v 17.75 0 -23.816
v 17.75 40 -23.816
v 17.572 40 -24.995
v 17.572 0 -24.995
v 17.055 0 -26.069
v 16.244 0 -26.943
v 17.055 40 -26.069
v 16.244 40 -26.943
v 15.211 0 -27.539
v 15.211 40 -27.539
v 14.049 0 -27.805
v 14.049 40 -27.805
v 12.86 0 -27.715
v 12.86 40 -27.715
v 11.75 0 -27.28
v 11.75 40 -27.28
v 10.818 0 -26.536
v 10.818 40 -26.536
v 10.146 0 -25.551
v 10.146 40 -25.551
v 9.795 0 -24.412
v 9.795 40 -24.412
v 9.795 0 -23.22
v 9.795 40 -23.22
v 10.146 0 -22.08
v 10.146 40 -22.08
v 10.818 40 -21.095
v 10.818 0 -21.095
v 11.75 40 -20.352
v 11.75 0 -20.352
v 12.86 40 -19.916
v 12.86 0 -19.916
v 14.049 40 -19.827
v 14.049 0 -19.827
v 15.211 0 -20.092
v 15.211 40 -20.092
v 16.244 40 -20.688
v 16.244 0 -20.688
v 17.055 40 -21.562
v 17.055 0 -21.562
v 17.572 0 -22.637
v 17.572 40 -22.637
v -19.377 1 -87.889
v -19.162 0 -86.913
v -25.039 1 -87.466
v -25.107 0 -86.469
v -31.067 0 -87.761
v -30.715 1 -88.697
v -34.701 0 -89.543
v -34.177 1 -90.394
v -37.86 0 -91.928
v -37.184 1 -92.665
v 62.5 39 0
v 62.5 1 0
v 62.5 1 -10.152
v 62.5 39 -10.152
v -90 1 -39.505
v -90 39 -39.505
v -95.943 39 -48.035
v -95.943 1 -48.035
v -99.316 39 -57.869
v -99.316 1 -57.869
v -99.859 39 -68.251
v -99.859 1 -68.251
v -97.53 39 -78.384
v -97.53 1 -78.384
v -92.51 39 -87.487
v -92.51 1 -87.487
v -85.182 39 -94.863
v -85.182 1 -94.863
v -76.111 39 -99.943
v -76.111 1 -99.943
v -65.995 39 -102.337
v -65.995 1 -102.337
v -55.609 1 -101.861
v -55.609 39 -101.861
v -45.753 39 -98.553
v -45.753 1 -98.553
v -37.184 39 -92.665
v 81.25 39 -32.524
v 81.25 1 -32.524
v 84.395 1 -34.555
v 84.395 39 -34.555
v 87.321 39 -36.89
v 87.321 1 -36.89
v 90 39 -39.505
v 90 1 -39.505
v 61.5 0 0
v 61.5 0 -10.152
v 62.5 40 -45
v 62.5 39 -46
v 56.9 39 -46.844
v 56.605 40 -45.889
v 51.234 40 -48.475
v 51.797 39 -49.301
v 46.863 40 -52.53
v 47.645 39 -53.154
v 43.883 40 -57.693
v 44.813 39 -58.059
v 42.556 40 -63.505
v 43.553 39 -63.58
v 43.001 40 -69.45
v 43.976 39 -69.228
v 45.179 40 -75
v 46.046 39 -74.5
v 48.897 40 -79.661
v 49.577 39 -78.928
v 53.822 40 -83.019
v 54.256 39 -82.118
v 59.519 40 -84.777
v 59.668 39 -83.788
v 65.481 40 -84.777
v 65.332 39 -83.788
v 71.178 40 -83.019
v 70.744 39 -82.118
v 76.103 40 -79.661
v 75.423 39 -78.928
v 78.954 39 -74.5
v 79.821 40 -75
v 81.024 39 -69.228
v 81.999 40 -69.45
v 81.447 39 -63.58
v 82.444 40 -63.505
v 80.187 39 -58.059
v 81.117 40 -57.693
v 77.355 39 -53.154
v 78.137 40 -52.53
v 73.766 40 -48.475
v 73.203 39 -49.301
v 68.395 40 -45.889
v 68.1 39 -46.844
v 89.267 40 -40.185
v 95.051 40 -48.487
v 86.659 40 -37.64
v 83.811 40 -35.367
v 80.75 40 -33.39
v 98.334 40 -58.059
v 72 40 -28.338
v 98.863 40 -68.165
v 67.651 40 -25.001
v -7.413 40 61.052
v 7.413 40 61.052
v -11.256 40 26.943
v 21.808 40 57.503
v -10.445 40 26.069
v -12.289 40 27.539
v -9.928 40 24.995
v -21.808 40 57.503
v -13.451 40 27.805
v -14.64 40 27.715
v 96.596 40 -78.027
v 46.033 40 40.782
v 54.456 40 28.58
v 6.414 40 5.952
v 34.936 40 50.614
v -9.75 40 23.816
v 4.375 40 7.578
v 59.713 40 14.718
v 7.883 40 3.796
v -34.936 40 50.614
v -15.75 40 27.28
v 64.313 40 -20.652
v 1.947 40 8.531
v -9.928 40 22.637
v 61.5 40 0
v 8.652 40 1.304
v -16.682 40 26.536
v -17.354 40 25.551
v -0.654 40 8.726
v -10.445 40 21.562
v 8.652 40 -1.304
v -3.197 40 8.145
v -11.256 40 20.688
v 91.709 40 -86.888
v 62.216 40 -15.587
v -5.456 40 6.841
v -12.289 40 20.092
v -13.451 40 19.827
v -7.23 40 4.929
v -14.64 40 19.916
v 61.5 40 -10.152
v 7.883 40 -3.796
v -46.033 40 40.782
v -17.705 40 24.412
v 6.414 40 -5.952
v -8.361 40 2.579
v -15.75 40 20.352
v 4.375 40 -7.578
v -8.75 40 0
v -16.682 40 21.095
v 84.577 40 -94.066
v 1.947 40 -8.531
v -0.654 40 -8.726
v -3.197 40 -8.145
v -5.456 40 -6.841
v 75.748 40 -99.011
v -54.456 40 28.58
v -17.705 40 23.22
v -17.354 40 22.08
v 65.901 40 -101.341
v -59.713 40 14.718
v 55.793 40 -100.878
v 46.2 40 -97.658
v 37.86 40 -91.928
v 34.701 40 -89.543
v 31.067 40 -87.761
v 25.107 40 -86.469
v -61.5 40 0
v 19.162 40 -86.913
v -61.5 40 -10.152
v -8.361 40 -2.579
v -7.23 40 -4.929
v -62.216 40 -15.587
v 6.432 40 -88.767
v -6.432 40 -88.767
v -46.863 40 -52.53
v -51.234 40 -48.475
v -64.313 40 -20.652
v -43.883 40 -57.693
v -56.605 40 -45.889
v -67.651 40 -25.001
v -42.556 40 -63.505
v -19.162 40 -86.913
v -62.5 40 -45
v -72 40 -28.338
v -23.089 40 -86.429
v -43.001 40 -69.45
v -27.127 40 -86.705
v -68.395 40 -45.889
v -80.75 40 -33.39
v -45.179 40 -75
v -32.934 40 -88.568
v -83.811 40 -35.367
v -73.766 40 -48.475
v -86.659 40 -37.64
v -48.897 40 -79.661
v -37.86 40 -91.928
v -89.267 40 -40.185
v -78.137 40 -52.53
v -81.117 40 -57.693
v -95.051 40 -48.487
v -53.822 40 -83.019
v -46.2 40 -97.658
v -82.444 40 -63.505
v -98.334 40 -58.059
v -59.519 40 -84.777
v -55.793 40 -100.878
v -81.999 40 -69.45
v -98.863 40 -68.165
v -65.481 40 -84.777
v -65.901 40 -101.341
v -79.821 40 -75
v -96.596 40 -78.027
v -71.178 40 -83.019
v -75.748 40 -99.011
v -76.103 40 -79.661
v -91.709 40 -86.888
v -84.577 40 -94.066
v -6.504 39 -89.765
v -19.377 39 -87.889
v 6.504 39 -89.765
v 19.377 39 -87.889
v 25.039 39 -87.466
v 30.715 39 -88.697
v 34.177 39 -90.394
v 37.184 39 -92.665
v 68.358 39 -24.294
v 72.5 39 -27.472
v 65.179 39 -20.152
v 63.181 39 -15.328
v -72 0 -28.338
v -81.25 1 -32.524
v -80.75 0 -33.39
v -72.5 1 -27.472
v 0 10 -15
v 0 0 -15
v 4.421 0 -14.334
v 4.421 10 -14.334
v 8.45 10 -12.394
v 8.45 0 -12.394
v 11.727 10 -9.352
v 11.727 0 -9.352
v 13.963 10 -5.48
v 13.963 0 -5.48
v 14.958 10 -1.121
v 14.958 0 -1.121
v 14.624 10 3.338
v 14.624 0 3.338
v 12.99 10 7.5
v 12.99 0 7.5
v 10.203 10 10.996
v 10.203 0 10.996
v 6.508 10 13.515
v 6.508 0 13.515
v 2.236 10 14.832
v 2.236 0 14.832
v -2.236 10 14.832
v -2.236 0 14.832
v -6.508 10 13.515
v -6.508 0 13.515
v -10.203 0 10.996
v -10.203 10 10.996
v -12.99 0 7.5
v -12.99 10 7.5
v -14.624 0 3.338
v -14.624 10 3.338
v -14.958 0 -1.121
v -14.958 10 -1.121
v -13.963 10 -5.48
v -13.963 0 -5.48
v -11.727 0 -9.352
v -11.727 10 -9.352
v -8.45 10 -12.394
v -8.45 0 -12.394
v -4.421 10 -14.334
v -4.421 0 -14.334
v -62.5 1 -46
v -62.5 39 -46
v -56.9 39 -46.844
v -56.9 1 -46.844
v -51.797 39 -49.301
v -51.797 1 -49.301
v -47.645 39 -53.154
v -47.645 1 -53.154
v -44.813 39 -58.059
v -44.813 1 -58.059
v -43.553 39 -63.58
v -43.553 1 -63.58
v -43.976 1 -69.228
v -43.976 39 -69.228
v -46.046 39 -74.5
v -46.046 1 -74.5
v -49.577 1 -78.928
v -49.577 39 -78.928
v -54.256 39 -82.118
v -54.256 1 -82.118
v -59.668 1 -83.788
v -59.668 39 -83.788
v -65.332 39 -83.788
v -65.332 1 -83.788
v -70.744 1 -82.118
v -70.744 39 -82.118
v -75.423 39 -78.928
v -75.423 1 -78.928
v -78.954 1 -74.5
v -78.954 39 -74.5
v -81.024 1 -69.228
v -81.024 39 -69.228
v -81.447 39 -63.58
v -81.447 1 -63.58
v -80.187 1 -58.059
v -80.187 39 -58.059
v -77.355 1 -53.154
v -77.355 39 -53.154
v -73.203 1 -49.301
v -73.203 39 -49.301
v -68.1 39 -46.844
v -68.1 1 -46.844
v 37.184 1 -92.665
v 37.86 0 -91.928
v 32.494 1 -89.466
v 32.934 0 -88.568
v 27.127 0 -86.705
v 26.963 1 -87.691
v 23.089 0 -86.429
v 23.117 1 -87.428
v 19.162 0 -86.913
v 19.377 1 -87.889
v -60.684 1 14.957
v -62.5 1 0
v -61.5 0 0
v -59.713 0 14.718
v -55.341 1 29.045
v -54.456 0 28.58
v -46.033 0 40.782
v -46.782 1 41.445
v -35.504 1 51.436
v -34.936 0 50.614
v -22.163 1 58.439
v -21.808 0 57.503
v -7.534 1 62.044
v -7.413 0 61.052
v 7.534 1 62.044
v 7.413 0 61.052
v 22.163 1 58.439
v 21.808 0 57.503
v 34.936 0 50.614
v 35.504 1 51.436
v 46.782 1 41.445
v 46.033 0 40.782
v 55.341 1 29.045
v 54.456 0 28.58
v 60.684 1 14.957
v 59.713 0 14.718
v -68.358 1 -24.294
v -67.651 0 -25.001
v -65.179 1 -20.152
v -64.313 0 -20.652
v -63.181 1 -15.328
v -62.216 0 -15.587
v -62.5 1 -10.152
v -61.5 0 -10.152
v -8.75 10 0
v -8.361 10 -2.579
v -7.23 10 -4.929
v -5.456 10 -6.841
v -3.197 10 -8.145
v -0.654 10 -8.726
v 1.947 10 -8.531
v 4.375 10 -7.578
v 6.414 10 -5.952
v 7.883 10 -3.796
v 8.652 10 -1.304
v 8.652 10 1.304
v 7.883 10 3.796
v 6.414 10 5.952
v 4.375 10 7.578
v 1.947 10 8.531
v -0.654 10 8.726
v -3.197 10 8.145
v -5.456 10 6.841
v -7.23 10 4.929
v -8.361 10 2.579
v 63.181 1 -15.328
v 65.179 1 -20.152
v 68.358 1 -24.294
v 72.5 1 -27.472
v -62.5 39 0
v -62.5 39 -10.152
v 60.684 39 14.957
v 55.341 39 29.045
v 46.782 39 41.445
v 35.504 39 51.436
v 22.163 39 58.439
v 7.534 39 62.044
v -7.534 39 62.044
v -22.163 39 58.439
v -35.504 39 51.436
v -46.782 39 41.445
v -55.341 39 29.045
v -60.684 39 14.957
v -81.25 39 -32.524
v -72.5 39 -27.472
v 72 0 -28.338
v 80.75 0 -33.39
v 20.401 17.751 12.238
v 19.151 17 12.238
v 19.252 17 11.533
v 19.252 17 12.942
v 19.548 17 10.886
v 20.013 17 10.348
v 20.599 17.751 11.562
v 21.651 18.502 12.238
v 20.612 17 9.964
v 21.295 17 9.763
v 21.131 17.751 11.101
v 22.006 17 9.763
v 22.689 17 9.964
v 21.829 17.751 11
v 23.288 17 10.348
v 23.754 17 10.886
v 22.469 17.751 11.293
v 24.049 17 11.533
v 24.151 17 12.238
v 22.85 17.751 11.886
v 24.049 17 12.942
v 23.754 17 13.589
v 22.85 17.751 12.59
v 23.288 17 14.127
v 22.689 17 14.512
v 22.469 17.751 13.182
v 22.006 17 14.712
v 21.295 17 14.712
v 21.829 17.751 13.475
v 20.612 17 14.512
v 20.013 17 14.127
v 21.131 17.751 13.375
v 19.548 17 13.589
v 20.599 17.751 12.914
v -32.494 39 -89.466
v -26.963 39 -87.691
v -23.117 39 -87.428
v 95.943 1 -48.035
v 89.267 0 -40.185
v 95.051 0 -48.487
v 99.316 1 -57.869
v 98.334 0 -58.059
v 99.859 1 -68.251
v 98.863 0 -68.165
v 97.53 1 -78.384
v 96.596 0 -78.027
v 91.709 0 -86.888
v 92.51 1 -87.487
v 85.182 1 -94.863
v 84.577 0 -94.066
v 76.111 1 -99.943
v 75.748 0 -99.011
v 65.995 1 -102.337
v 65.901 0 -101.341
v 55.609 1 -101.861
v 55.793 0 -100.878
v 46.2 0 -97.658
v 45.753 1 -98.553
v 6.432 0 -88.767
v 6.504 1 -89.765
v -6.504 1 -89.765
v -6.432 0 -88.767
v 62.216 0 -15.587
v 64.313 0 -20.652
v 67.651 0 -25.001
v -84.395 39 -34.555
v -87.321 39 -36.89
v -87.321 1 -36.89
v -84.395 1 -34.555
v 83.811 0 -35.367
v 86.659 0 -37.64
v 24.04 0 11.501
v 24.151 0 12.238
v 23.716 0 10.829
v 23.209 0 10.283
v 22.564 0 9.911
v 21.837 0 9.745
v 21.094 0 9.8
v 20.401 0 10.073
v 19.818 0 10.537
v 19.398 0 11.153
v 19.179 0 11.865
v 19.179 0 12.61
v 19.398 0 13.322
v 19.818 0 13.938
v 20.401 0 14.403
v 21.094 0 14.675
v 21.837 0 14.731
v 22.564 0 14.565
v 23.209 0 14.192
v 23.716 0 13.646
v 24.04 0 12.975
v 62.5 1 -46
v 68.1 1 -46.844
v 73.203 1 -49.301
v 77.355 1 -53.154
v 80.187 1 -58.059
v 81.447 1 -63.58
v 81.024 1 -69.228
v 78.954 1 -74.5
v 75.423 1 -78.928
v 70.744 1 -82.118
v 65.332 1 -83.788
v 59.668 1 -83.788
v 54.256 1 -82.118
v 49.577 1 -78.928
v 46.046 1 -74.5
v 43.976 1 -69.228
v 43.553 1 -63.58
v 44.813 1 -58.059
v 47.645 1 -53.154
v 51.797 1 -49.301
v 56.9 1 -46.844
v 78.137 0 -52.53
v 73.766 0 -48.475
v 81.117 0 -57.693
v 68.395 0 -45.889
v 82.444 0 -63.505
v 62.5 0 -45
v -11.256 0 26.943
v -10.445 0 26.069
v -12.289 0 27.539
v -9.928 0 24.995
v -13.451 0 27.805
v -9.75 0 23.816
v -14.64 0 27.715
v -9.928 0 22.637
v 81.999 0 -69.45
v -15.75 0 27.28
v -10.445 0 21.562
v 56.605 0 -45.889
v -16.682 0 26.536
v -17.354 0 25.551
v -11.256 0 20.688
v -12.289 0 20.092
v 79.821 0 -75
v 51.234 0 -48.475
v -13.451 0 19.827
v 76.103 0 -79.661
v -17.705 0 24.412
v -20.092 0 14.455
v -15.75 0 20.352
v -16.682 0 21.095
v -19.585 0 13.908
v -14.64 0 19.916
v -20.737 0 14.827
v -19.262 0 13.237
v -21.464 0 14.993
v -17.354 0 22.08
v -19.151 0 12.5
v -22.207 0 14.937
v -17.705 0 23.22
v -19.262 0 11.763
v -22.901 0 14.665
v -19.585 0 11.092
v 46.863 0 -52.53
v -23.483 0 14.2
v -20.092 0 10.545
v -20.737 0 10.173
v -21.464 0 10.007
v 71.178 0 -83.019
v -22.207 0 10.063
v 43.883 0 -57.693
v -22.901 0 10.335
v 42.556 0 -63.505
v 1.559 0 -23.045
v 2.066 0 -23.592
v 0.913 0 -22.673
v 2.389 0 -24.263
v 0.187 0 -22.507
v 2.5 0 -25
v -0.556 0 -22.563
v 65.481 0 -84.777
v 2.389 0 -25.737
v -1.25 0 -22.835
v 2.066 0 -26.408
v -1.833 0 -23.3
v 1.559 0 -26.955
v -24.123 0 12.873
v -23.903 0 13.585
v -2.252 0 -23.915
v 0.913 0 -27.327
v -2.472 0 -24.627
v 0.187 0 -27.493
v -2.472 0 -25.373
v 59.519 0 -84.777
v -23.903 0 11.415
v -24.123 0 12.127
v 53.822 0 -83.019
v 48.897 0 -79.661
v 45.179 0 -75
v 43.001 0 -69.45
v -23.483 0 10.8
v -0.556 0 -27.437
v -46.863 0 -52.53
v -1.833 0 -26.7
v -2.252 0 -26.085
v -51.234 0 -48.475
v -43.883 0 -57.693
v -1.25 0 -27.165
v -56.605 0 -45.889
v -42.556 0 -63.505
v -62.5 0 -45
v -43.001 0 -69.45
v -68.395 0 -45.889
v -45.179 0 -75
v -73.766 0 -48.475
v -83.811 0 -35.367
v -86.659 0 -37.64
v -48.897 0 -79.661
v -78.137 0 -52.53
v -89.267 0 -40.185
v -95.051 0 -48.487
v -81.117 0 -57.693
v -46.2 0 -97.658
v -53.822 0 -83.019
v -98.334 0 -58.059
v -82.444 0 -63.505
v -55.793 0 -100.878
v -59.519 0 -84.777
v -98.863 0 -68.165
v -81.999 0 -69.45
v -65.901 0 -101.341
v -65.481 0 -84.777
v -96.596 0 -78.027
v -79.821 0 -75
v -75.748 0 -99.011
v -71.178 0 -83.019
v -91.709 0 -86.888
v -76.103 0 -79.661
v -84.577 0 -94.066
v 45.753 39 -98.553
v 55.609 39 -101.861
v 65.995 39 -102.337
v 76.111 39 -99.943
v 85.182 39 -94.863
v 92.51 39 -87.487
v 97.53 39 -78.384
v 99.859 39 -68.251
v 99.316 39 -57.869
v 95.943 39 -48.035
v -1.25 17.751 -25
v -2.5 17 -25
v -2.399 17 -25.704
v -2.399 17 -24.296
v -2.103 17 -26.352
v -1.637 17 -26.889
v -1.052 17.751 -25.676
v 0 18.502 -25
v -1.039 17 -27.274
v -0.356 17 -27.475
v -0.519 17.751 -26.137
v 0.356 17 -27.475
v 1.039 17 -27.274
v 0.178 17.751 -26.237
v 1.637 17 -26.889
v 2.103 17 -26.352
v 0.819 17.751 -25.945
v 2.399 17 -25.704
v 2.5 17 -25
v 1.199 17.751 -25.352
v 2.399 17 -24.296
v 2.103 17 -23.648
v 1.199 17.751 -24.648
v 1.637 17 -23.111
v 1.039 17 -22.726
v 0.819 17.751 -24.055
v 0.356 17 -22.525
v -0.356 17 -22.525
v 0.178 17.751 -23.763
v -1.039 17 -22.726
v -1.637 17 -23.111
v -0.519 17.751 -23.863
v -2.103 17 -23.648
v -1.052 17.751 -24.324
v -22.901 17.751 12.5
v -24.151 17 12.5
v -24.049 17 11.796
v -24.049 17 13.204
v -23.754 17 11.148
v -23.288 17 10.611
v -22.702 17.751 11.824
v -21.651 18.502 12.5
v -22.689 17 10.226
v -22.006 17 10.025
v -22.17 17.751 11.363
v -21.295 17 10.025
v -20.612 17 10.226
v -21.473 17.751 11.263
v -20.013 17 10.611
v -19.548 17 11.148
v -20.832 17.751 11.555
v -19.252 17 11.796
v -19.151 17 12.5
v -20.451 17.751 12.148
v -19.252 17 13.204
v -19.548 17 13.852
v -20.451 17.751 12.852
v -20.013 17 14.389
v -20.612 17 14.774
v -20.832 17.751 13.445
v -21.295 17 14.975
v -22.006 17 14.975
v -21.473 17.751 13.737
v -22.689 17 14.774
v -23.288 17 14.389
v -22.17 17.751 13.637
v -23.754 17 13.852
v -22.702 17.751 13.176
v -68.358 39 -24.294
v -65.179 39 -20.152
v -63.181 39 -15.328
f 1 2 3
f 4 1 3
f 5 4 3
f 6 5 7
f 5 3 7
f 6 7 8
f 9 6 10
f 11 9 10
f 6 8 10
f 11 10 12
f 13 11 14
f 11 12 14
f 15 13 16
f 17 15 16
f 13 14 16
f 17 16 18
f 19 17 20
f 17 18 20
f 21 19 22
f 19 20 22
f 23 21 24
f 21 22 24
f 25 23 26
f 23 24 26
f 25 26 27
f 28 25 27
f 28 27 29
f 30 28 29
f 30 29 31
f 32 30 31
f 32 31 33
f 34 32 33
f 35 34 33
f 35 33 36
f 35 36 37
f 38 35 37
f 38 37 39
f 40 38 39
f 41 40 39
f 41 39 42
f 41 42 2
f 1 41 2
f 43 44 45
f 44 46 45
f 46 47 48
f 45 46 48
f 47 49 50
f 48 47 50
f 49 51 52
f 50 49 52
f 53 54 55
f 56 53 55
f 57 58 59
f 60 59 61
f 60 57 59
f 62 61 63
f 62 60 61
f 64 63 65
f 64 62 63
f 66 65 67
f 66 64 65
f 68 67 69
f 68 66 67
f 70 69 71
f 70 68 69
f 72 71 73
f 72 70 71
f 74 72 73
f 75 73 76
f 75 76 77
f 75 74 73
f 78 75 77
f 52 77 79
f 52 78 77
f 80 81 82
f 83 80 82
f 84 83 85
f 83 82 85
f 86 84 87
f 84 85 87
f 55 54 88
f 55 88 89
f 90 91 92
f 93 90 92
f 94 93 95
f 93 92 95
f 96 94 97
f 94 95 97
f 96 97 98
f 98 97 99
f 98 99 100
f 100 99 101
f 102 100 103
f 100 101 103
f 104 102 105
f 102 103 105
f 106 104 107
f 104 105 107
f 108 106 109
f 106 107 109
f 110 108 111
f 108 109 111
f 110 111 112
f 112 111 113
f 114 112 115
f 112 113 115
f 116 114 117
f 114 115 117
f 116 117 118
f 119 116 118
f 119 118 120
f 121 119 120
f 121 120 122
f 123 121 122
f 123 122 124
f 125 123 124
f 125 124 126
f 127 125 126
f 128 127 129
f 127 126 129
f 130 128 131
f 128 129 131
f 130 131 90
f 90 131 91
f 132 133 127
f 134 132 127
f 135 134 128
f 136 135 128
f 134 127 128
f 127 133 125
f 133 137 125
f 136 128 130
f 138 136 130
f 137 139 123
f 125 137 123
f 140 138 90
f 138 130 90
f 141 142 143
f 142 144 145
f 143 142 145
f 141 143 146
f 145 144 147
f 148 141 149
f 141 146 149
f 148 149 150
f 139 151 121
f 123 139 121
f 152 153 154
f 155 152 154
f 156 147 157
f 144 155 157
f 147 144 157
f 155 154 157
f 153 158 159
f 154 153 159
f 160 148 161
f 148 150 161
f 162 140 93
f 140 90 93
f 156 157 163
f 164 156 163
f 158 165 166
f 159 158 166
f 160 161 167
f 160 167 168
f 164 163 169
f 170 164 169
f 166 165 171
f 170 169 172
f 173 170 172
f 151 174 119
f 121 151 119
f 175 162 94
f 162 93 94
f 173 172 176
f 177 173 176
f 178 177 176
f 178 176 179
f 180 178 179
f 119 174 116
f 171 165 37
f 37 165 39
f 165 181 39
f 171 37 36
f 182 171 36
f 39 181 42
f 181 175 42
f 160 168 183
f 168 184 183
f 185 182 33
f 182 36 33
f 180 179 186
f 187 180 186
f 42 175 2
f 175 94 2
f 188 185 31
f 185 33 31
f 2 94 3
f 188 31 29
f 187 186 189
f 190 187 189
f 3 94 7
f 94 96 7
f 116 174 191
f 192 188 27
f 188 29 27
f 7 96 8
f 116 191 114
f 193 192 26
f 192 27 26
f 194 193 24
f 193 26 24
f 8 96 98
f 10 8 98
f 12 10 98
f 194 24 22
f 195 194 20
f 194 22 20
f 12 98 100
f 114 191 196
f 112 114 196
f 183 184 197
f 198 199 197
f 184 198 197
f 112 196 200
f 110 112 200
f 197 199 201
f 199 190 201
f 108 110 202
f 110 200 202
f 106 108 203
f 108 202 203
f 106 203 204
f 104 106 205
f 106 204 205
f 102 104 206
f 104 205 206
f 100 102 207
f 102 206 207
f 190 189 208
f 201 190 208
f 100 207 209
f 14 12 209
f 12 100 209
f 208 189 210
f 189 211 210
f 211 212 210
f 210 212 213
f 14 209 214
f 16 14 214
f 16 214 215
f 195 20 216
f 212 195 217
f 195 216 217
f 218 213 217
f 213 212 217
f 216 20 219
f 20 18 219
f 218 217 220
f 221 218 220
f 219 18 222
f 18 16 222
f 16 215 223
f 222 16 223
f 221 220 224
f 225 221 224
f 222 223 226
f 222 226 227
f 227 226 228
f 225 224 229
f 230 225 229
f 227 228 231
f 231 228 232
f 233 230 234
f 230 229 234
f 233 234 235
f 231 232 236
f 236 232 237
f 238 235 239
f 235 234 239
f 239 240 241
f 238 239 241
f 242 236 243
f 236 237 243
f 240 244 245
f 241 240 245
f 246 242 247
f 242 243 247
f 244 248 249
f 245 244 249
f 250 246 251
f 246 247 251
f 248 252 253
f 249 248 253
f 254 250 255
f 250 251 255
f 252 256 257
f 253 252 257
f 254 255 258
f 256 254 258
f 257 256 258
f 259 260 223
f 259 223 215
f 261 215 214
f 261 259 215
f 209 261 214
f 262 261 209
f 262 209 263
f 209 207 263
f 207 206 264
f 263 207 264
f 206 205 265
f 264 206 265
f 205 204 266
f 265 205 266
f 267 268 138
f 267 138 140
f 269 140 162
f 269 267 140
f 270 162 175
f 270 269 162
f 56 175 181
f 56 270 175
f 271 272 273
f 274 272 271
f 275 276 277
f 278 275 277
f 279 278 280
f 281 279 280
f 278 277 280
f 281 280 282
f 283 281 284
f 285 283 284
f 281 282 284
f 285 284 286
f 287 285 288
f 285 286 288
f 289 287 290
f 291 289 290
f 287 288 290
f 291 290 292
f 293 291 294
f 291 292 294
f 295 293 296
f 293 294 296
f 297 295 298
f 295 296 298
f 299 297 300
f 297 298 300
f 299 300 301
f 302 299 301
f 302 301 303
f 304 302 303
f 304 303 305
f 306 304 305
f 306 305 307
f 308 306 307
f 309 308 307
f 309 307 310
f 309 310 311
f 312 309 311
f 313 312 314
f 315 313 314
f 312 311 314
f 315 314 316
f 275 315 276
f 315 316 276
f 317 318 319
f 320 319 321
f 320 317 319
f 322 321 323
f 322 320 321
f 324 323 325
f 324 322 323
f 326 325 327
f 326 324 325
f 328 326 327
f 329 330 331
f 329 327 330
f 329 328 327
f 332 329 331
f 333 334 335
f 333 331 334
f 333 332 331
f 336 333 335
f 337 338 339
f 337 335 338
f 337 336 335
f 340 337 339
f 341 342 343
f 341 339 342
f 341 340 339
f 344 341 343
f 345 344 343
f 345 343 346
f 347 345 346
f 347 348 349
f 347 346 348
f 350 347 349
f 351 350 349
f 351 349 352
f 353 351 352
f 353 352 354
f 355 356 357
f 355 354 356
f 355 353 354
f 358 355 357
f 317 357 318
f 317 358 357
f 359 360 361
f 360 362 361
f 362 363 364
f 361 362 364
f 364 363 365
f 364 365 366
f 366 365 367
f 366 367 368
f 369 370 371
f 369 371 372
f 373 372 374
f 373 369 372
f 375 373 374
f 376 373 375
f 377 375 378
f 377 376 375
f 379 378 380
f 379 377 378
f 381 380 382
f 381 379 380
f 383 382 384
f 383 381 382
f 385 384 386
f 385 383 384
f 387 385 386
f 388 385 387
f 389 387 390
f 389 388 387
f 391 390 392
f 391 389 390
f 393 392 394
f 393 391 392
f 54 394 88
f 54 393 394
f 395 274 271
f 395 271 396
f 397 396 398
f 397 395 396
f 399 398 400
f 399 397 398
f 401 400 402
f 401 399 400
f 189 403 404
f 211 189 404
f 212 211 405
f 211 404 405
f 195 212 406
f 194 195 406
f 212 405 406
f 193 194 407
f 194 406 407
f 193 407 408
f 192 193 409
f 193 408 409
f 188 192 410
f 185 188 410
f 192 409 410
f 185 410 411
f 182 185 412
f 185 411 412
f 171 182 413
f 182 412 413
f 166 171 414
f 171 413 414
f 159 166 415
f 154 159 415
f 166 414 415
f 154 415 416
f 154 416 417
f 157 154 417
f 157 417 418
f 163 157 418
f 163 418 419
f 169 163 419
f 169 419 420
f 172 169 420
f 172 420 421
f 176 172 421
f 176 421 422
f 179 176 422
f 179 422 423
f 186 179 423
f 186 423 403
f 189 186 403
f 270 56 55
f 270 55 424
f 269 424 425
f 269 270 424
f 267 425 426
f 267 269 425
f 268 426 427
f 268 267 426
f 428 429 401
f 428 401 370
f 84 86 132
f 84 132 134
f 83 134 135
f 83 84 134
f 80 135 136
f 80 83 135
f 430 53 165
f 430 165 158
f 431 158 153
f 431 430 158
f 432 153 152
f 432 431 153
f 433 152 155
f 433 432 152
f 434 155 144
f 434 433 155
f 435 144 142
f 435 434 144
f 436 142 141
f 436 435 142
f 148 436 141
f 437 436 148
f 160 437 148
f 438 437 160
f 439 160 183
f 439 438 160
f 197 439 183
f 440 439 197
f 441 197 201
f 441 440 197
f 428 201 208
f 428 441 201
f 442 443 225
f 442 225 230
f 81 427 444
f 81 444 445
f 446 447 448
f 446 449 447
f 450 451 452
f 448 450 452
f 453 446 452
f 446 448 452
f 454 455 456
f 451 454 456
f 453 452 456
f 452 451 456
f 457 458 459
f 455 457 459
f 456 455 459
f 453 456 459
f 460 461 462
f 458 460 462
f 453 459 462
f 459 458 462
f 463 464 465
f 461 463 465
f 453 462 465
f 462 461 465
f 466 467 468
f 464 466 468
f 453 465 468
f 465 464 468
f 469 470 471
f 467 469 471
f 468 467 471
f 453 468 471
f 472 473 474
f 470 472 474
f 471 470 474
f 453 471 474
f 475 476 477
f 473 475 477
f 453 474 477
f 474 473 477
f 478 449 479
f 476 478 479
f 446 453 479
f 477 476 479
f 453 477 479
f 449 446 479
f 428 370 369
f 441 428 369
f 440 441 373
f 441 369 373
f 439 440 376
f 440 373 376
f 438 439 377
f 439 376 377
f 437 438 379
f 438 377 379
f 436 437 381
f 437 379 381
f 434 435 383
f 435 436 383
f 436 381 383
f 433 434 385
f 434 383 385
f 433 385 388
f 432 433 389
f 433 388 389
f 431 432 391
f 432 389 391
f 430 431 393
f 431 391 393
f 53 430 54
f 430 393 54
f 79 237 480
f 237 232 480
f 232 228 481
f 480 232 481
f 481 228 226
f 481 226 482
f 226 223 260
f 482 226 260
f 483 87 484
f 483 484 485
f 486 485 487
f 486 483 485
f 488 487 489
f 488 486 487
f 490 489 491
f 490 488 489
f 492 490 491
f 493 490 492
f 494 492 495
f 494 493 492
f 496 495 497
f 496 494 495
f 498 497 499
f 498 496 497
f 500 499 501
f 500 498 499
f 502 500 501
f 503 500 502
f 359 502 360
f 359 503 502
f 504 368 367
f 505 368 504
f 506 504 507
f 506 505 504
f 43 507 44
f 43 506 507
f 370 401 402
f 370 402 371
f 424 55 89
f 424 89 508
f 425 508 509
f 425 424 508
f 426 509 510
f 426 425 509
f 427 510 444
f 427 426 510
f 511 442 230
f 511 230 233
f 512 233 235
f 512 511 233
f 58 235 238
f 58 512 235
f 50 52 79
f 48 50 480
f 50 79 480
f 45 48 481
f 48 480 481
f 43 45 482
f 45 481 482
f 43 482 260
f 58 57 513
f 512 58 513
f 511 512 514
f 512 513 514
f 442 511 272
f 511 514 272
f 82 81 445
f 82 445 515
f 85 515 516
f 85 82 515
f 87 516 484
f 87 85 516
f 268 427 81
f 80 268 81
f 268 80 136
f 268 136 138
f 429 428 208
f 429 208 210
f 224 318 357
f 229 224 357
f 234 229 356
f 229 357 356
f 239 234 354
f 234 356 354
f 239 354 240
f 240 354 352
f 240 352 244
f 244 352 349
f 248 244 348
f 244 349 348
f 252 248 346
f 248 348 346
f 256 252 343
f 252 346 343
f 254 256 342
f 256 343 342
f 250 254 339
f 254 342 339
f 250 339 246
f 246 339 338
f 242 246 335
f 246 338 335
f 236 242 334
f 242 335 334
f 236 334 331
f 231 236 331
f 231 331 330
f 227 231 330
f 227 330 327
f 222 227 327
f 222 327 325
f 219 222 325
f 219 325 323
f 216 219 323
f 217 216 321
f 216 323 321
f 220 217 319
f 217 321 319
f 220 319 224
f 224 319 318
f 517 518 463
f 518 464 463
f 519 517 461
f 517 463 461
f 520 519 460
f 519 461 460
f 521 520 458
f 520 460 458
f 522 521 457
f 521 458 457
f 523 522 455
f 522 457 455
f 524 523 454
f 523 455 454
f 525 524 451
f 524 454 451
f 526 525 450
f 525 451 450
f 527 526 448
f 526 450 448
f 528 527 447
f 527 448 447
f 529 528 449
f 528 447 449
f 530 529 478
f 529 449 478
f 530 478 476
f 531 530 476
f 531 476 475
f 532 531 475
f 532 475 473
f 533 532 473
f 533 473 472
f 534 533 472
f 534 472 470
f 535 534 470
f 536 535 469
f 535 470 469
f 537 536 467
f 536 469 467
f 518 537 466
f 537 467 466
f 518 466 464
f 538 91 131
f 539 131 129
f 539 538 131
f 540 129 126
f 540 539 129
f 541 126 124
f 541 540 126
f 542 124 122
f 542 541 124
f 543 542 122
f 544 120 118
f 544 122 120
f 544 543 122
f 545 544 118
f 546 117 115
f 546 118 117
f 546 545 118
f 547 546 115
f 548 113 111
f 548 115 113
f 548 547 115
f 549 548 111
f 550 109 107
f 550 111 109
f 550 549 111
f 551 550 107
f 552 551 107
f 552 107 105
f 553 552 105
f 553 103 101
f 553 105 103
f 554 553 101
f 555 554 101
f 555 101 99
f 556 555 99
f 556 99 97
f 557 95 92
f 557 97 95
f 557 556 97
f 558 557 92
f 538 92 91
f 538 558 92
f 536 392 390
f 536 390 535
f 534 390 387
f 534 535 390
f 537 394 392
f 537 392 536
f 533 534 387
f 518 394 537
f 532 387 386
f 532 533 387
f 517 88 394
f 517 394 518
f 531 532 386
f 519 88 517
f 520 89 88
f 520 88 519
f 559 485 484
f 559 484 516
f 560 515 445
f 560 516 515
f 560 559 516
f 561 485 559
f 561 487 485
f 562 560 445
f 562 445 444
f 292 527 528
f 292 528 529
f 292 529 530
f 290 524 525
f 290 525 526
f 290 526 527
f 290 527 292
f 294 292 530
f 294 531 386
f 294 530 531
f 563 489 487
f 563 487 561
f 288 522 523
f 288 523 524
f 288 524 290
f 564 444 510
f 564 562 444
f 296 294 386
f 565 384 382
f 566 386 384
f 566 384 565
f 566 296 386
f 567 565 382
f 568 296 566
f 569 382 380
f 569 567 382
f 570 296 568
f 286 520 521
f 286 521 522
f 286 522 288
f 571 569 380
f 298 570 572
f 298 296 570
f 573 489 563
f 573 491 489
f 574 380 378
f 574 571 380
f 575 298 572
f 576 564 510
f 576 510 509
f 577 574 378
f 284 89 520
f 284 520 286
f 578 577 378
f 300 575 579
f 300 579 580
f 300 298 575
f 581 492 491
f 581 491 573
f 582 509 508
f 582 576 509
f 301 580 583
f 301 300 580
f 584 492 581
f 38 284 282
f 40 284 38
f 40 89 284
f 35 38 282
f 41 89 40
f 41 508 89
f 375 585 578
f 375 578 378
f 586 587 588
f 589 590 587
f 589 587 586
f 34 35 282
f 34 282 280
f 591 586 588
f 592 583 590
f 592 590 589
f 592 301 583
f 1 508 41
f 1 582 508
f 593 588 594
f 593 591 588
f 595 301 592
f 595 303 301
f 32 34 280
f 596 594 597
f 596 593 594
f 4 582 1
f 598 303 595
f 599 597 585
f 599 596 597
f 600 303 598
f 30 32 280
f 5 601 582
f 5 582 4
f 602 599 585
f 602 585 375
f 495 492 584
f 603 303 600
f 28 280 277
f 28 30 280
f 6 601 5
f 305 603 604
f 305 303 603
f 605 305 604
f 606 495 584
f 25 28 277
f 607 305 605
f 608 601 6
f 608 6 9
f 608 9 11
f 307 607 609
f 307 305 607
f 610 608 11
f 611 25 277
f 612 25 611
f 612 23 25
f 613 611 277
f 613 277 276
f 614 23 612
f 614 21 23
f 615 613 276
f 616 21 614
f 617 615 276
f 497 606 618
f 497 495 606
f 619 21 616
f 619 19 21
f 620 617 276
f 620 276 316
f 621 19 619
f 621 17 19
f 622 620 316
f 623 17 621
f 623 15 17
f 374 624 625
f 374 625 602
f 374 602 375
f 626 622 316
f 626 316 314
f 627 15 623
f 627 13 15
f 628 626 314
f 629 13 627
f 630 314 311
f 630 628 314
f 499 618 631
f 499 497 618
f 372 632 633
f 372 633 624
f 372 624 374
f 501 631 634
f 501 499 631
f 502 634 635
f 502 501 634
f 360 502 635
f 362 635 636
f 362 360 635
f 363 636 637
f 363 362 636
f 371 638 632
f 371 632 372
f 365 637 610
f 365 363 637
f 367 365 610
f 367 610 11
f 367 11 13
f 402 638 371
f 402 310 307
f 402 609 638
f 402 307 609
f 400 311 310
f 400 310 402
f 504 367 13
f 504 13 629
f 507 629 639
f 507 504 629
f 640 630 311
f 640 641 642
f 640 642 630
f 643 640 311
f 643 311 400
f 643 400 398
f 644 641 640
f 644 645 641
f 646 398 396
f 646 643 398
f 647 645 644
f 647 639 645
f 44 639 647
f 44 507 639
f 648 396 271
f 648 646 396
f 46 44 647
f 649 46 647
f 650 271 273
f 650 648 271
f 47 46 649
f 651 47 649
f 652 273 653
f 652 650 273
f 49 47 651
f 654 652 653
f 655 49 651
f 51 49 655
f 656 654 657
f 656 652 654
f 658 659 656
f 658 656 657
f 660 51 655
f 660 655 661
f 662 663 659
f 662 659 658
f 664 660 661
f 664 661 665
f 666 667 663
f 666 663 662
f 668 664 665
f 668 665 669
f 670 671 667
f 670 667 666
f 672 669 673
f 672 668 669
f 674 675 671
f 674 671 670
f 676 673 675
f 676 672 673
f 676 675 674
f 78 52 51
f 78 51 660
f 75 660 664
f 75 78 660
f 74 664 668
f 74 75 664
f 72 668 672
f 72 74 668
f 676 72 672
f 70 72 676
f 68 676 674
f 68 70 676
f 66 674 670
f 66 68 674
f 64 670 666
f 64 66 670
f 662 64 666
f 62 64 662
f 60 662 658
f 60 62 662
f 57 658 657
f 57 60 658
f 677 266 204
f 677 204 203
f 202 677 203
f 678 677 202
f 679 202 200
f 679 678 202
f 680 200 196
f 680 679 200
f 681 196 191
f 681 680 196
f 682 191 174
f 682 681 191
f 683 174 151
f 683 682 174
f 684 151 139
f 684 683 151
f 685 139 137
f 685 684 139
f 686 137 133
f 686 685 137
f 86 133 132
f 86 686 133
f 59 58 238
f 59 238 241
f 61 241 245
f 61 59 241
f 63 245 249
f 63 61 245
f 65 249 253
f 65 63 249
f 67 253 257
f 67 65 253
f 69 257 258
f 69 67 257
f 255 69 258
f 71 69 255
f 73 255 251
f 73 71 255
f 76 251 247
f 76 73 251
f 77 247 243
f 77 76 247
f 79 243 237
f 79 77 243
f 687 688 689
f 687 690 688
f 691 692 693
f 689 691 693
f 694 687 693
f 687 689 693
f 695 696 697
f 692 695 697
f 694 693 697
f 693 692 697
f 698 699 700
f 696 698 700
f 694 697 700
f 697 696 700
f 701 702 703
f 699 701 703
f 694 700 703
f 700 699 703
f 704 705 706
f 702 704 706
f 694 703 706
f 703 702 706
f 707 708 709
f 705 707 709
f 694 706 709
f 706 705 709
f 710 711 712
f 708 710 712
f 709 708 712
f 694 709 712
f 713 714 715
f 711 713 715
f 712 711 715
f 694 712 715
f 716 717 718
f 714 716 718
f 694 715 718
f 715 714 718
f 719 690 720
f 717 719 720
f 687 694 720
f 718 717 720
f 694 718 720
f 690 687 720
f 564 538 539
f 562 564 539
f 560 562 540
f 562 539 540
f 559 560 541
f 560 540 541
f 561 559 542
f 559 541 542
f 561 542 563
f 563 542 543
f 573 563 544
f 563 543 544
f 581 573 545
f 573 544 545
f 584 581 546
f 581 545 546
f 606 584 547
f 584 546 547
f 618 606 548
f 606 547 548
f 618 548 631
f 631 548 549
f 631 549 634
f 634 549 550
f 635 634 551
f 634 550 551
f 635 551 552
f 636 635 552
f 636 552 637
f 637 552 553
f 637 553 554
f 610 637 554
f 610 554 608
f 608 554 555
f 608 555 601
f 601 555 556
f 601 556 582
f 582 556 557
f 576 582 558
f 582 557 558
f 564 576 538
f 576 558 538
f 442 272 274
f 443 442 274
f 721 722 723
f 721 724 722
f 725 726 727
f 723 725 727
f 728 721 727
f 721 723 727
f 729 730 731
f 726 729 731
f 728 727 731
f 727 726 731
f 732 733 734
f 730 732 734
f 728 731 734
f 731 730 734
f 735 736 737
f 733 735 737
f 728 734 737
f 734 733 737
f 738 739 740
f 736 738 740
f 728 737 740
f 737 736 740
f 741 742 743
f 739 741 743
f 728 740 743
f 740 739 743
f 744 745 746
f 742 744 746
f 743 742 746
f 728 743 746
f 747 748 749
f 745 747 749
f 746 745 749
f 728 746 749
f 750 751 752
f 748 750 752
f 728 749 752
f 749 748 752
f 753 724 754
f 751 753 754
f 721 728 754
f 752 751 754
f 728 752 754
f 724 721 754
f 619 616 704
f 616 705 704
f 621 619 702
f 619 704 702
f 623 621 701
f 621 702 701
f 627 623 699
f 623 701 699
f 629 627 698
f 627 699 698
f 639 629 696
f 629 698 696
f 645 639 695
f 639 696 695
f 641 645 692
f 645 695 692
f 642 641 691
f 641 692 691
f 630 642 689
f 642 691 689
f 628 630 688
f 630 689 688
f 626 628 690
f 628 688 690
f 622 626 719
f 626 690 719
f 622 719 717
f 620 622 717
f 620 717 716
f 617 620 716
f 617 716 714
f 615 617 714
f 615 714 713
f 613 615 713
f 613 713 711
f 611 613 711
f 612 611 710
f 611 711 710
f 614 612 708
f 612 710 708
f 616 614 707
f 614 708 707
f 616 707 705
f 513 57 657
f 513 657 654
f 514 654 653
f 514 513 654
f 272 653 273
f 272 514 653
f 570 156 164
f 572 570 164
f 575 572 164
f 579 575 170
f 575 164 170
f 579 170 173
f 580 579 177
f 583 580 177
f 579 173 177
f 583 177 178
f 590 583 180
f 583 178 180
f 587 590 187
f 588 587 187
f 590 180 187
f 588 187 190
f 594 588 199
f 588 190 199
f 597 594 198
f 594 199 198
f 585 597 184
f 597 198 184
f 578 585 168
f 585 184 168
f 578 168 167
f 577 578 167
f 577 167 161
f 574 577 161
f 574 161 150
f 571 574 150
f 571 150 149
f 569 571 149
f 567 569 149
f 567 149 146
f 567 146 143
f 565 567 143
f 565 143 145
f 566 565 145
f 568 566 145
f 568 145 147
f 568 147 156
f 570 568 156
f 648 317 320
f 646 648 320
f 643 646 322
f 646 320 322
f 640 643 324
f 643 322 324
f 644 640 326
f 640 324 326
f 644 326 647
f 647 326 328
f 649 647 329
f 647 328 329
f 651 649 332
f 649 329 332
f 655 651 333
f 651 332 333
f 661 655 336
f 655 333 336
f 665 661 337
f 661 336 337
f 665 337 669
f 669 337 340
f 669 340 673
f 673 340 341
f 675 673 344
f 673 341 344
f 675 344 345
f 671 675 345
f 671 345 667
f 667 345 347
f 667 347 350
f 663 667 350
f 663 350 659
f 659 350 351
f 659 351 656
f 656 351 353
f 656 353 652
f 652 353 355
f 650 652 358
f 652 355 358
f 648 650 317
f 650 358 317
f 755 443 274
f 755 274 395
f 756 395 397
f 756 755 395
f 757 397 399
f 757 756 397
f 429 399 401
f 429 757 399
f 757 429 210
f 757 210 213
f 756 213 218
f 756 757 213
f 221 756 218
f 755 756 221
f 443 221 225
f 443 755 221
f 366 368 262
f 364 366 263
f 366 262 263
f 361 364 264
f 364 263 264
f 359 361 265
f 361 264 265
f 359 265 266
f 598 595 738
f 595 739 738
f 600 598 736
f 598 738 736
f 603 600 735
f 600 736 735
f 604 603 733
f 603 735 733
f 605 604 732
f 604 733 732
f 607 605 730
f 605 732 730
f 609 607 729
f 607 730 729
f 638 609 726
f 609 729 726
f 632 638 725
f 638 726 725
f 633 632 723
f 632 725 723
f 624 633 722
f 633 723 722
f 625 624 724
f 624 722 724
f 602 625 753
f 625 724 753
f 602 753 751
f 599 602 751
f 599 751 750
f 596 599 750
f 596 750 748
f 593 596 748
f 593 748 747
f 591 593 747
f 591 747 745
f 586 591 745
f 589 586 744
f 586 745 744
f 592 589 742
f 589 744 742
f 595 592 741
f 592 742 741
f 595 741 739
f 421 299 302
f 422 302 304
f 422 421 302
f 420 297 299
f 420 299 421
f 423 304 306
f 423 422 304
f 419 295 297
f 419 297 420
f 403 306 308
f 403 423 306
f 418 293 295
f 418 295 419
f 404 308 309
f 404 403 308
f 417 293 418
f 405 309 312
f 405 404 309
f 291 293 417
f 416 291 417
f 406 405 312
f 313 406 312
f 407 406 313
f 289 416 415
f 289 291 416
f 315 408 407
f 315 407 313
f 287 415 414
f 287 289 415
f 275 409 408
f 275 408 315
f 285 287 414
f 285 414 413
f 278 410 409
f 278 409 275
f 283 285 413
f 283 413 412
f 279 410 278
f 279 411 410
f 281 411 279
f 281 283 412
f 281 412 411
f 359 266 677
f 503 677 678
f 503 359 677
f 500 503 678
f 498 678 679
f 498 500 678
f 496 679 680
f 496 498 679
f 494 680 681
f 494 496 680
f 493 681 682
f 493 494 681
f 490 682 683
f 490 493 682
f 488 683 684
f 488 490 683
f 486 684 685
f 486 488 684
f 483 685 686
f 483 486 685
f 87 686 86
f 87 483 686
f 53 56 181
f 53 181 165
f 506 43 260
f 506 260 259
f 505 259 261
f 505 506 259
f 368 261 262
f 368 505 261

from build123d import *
from build123d.topology import SkipClean

# Parameters (mm, degrees)
BOSS_EXTRUDE1_DEPTH   = 40
CUT_EXTRUDE4_DEPTH    = 149.681707012
FILLET1_R             = 20
CUT_EXTRUDE2_REACH    = 150.682
SKETCH3_R             = 19
M20_TAPPED_HOLE1_D    = 17.5
SKETCH8_R             = 15
CUT_EXTRUDE3_DEPTH    = 10
M6_TAPPED_HOLE1_D     = 5
M6_TAPPED_HOLE1_DEPTH = 17
M6_TAPPED_HOLE1_TIP   = 1.502151548
F_8_0MM_DOWEL_HOLE1_D = 8
CHAMFER1_SIZE         = 1


with BuildPart() as part:
    # Sketch1 → Boss-Extrude1 (new body)
    with BuildSketch(Plane(origin=(0, 0, 0), x_dir=(1, 0, 0), z_dir=(0, 1, 0))):
        with BuildLine():
            Line((-90, 0), (-90, 39.504902432))
            ThreePointArc((-90, 39.504902432), (-85.182396525, 94.862332258), (-30.561841884, 84.652075111))
            ThreePointArc((-30.561841884, 84.652075111), (0, 90), (30.561841884, 84.652075111))
            ThreePointArc((30.561841884, 84.652075111), (85.182396525, 94.862332258), (90, 39.504902432))
            Line((90, 39.504902432), (90, 0))
            ThreePointArc((90, 0), (0, -90), (-90, 0))
        make_face()
    extrude(amount=BOSS_EXTRUDE1_DEPTH)

    # Sketch2 → Cut-Extrude4 (cut, through all)
    with SkipClean():  # the faces are left unmerged after this step: merging them gives an invalid solid
        with BuildSketch(Plane(origin=(0, 0, 0), x_dir=(1, 0, 0), z_dir=(0, 1, 0))):
            with BuildLine():
                Line((-81.25, 32.524047358), (-62.5, 21.698729811))
                Line((-62.5, 21.698729811), (-62.5, 0))
                ThreePointArc((-62.5, 0), (0, -62.5), (62.5, 0))
                Line((62.5, 0), (62.5, 21.698729811))
                Line((62.5, 21.698729811), (81.25, 32.524047358))
                ThreePointArc((81.25, 32.524047358), (85.886934587, 35.68615872), (90, 39.504902432))
                Line((90, 39.504902432), (90, 0))
                ThreePointArc((90, 0), (0, -90), (-90, 0))
                Line((-90, 0), (-90, 39.504902432))
                ThreePointArc((-90, 39.504902432), (-85.886934587, 35.68615872), (-81.25, 32.524047358))
            make_face()
        extrude(amount=CUT_EXTRUDE4_DEPTH, mode=Mode.SUBTRACT)

    # Fillet1
    fillet1_edges = [part.edges().sort_by_distance(p)[0] for p in [
        (30.561841884, 20, -84.652075111),
        (-30.561841884, 20, -84.652075111),
        (-62.5, 20, -21.698729811),
        (62.5, 20, -21.698729811),
    ]]
    fillet(fillet1_edges, radius=FILLET1_R)

    # Sketch3 → Cut-Extrude2 (cut, up to next)
    with BuildSketch(Plane(origin=(0, 0, 0), x_dir=(1, 0, 0), z_dir=(0, 1, 0)), mode=Mode.PRIVATE) as cut_extrude2_sk1:
        with Locations(Location((-62.5, 65, 0), (0, 0, 270))):
            Circle(SKETCH3_R)
    cut_extrude2_tool1 = extrude(cut_extrude2_sk1.sketch, amount=CUT_EXTRUDE2_REACH, mode=Mode.PRIVATE) & part.part
    # Sketch3 → Cut-Extrude2 (cut, up to next)
    with BuildSketch(Plane(origin=(0, 0, 0), x_dir=(1, 0, 0), z_dir=(0, 1, 0)), mode=Mode.PRIVATE) as cut_extrude2_sk2:
        with Locations(Location((62.5, 65, 0), (0, 0, 270))):
            Circle(SKETCH3_R)
    cut_extrude2_tool2 = extrude(cut_extrude2_sk2.sketch, amount=CUT_EXTRUDE2_REACH, mode=Mode.PRIVATE) & part.part
    add(cut_extrude2_tool1.solids().sort_by_distance((-62.5, 0, -65))[0], mode=Mode.SUBTRACT)
    add(cut_extrude2_tool2.solids().sort_by_distance((62.5, 0, -65))[0], mode=Mode.SUBTRACT)

    # M20 Tapped Hole1 (through all)
    with Locations(Plane(origin=(0, 40, 0), x_dir=(1, 0, 0), z_dir=(0, 1, 0))):
        with Locations((0, 0)):
            Hole(M20_TAPPED_HOLE1_D / 2)

    # Sketch8 → Cut-Extrude3 (cut)
    with SkipClean():  # the faces are left unmerged after this step: merging them gives an invalid solid
        with BuildSketch(Plane.XZ):
            with Locations(Location((0, 0, 0), (0, 0, 270))):
                Circle(SKETCH8_R)
        extrude(amount=-CUT_EXTRUDE3_DEPTH, mode=Mode.SUBTRACT)

    # M6 Tapped Hole1
    with Locations(Plane(origin=(0, 0, 0), x_dir=(-1, 0, 0), z_dir=(0, -1, 0))):
        with Locations((-21.650635095, -12.237722392), (21.650635095, -12.5), (0, 25)):
            Hole(M6_TAPPED_HOLE1_D / 2, depth=M6_TAPPED_HOLE1_DEPTH)
            with Locations((0, 0, -(M6_TAPPED_HOLE1_DEPTH + M6_TAPPED_HOLE1_TIP / 2))):  # 118° drill point
                Cone(0, M6_TAPPED_HOLE1_D / 2, M6_TAPPED_HOLE1_TIP, mode=Mode.SUBTRACT)

    # Ø8.0mm Dowel Hole1 (through all)
    with Locations(Plane(origin=(0, 0, 0), x_dir=(-1, 0, 0), z_dir=(0, -1, 0))):
        with Locations((13.75, -23.815698604), (-13.75, 23.815698604)):
            Hole(F_8_0MM_DOWEL_HOLE1_D / 2)

    # Chamfer1
    chamfer1_edges = [part.edges().sort_by_distance(p)[0] for p in [
        (89.102687271, 40, -91.430040295),
        (0, 0, 62.5),
        (-62.5, 0, -5.075862213),
        (76.875, 0, -29.99813993),
        (0, 40, 62.5),
        (-62.5, 40, -5.075862213),
        (76.875, 40, -29.99813993),
        (62.5, 0, -5.075862213),
        (62.5, 40, -5.075862213),
        (-76.875, 0, -29.99813993),
        (-76.875, 40, -29.99813993),
        (0, 0, -90),
        (0, 40, -90),
        (-89.102687271, 0, -91.430040295),
        (-89.102687271, 40, -91.430040295),
        (65.179491924, 0, -20.151724427),
        (65.179491924, 40, -20.151724427),
        (-65.179491924, 0, -20.151724427),
        (-65.179491924, 40, -20.151724427),
        (28.863873105, 0, -88.103017476),
        (28.863873105, 40, -88.103017476),
        (-28.863873105, 0, -88.103017476),
        (-28.863873105, 40, -88.103017476),
        (89.102687271, 0, -91.430040295),
        (-62.5, 0, -84),
        (-62.5, 40, -84),
        (62.5, 0, -84),
        (62.5, 40, -84),
    ]]
    chamfer(chamfer1_edges, length=CHAMFER1_SIZE)


solid = part.part
